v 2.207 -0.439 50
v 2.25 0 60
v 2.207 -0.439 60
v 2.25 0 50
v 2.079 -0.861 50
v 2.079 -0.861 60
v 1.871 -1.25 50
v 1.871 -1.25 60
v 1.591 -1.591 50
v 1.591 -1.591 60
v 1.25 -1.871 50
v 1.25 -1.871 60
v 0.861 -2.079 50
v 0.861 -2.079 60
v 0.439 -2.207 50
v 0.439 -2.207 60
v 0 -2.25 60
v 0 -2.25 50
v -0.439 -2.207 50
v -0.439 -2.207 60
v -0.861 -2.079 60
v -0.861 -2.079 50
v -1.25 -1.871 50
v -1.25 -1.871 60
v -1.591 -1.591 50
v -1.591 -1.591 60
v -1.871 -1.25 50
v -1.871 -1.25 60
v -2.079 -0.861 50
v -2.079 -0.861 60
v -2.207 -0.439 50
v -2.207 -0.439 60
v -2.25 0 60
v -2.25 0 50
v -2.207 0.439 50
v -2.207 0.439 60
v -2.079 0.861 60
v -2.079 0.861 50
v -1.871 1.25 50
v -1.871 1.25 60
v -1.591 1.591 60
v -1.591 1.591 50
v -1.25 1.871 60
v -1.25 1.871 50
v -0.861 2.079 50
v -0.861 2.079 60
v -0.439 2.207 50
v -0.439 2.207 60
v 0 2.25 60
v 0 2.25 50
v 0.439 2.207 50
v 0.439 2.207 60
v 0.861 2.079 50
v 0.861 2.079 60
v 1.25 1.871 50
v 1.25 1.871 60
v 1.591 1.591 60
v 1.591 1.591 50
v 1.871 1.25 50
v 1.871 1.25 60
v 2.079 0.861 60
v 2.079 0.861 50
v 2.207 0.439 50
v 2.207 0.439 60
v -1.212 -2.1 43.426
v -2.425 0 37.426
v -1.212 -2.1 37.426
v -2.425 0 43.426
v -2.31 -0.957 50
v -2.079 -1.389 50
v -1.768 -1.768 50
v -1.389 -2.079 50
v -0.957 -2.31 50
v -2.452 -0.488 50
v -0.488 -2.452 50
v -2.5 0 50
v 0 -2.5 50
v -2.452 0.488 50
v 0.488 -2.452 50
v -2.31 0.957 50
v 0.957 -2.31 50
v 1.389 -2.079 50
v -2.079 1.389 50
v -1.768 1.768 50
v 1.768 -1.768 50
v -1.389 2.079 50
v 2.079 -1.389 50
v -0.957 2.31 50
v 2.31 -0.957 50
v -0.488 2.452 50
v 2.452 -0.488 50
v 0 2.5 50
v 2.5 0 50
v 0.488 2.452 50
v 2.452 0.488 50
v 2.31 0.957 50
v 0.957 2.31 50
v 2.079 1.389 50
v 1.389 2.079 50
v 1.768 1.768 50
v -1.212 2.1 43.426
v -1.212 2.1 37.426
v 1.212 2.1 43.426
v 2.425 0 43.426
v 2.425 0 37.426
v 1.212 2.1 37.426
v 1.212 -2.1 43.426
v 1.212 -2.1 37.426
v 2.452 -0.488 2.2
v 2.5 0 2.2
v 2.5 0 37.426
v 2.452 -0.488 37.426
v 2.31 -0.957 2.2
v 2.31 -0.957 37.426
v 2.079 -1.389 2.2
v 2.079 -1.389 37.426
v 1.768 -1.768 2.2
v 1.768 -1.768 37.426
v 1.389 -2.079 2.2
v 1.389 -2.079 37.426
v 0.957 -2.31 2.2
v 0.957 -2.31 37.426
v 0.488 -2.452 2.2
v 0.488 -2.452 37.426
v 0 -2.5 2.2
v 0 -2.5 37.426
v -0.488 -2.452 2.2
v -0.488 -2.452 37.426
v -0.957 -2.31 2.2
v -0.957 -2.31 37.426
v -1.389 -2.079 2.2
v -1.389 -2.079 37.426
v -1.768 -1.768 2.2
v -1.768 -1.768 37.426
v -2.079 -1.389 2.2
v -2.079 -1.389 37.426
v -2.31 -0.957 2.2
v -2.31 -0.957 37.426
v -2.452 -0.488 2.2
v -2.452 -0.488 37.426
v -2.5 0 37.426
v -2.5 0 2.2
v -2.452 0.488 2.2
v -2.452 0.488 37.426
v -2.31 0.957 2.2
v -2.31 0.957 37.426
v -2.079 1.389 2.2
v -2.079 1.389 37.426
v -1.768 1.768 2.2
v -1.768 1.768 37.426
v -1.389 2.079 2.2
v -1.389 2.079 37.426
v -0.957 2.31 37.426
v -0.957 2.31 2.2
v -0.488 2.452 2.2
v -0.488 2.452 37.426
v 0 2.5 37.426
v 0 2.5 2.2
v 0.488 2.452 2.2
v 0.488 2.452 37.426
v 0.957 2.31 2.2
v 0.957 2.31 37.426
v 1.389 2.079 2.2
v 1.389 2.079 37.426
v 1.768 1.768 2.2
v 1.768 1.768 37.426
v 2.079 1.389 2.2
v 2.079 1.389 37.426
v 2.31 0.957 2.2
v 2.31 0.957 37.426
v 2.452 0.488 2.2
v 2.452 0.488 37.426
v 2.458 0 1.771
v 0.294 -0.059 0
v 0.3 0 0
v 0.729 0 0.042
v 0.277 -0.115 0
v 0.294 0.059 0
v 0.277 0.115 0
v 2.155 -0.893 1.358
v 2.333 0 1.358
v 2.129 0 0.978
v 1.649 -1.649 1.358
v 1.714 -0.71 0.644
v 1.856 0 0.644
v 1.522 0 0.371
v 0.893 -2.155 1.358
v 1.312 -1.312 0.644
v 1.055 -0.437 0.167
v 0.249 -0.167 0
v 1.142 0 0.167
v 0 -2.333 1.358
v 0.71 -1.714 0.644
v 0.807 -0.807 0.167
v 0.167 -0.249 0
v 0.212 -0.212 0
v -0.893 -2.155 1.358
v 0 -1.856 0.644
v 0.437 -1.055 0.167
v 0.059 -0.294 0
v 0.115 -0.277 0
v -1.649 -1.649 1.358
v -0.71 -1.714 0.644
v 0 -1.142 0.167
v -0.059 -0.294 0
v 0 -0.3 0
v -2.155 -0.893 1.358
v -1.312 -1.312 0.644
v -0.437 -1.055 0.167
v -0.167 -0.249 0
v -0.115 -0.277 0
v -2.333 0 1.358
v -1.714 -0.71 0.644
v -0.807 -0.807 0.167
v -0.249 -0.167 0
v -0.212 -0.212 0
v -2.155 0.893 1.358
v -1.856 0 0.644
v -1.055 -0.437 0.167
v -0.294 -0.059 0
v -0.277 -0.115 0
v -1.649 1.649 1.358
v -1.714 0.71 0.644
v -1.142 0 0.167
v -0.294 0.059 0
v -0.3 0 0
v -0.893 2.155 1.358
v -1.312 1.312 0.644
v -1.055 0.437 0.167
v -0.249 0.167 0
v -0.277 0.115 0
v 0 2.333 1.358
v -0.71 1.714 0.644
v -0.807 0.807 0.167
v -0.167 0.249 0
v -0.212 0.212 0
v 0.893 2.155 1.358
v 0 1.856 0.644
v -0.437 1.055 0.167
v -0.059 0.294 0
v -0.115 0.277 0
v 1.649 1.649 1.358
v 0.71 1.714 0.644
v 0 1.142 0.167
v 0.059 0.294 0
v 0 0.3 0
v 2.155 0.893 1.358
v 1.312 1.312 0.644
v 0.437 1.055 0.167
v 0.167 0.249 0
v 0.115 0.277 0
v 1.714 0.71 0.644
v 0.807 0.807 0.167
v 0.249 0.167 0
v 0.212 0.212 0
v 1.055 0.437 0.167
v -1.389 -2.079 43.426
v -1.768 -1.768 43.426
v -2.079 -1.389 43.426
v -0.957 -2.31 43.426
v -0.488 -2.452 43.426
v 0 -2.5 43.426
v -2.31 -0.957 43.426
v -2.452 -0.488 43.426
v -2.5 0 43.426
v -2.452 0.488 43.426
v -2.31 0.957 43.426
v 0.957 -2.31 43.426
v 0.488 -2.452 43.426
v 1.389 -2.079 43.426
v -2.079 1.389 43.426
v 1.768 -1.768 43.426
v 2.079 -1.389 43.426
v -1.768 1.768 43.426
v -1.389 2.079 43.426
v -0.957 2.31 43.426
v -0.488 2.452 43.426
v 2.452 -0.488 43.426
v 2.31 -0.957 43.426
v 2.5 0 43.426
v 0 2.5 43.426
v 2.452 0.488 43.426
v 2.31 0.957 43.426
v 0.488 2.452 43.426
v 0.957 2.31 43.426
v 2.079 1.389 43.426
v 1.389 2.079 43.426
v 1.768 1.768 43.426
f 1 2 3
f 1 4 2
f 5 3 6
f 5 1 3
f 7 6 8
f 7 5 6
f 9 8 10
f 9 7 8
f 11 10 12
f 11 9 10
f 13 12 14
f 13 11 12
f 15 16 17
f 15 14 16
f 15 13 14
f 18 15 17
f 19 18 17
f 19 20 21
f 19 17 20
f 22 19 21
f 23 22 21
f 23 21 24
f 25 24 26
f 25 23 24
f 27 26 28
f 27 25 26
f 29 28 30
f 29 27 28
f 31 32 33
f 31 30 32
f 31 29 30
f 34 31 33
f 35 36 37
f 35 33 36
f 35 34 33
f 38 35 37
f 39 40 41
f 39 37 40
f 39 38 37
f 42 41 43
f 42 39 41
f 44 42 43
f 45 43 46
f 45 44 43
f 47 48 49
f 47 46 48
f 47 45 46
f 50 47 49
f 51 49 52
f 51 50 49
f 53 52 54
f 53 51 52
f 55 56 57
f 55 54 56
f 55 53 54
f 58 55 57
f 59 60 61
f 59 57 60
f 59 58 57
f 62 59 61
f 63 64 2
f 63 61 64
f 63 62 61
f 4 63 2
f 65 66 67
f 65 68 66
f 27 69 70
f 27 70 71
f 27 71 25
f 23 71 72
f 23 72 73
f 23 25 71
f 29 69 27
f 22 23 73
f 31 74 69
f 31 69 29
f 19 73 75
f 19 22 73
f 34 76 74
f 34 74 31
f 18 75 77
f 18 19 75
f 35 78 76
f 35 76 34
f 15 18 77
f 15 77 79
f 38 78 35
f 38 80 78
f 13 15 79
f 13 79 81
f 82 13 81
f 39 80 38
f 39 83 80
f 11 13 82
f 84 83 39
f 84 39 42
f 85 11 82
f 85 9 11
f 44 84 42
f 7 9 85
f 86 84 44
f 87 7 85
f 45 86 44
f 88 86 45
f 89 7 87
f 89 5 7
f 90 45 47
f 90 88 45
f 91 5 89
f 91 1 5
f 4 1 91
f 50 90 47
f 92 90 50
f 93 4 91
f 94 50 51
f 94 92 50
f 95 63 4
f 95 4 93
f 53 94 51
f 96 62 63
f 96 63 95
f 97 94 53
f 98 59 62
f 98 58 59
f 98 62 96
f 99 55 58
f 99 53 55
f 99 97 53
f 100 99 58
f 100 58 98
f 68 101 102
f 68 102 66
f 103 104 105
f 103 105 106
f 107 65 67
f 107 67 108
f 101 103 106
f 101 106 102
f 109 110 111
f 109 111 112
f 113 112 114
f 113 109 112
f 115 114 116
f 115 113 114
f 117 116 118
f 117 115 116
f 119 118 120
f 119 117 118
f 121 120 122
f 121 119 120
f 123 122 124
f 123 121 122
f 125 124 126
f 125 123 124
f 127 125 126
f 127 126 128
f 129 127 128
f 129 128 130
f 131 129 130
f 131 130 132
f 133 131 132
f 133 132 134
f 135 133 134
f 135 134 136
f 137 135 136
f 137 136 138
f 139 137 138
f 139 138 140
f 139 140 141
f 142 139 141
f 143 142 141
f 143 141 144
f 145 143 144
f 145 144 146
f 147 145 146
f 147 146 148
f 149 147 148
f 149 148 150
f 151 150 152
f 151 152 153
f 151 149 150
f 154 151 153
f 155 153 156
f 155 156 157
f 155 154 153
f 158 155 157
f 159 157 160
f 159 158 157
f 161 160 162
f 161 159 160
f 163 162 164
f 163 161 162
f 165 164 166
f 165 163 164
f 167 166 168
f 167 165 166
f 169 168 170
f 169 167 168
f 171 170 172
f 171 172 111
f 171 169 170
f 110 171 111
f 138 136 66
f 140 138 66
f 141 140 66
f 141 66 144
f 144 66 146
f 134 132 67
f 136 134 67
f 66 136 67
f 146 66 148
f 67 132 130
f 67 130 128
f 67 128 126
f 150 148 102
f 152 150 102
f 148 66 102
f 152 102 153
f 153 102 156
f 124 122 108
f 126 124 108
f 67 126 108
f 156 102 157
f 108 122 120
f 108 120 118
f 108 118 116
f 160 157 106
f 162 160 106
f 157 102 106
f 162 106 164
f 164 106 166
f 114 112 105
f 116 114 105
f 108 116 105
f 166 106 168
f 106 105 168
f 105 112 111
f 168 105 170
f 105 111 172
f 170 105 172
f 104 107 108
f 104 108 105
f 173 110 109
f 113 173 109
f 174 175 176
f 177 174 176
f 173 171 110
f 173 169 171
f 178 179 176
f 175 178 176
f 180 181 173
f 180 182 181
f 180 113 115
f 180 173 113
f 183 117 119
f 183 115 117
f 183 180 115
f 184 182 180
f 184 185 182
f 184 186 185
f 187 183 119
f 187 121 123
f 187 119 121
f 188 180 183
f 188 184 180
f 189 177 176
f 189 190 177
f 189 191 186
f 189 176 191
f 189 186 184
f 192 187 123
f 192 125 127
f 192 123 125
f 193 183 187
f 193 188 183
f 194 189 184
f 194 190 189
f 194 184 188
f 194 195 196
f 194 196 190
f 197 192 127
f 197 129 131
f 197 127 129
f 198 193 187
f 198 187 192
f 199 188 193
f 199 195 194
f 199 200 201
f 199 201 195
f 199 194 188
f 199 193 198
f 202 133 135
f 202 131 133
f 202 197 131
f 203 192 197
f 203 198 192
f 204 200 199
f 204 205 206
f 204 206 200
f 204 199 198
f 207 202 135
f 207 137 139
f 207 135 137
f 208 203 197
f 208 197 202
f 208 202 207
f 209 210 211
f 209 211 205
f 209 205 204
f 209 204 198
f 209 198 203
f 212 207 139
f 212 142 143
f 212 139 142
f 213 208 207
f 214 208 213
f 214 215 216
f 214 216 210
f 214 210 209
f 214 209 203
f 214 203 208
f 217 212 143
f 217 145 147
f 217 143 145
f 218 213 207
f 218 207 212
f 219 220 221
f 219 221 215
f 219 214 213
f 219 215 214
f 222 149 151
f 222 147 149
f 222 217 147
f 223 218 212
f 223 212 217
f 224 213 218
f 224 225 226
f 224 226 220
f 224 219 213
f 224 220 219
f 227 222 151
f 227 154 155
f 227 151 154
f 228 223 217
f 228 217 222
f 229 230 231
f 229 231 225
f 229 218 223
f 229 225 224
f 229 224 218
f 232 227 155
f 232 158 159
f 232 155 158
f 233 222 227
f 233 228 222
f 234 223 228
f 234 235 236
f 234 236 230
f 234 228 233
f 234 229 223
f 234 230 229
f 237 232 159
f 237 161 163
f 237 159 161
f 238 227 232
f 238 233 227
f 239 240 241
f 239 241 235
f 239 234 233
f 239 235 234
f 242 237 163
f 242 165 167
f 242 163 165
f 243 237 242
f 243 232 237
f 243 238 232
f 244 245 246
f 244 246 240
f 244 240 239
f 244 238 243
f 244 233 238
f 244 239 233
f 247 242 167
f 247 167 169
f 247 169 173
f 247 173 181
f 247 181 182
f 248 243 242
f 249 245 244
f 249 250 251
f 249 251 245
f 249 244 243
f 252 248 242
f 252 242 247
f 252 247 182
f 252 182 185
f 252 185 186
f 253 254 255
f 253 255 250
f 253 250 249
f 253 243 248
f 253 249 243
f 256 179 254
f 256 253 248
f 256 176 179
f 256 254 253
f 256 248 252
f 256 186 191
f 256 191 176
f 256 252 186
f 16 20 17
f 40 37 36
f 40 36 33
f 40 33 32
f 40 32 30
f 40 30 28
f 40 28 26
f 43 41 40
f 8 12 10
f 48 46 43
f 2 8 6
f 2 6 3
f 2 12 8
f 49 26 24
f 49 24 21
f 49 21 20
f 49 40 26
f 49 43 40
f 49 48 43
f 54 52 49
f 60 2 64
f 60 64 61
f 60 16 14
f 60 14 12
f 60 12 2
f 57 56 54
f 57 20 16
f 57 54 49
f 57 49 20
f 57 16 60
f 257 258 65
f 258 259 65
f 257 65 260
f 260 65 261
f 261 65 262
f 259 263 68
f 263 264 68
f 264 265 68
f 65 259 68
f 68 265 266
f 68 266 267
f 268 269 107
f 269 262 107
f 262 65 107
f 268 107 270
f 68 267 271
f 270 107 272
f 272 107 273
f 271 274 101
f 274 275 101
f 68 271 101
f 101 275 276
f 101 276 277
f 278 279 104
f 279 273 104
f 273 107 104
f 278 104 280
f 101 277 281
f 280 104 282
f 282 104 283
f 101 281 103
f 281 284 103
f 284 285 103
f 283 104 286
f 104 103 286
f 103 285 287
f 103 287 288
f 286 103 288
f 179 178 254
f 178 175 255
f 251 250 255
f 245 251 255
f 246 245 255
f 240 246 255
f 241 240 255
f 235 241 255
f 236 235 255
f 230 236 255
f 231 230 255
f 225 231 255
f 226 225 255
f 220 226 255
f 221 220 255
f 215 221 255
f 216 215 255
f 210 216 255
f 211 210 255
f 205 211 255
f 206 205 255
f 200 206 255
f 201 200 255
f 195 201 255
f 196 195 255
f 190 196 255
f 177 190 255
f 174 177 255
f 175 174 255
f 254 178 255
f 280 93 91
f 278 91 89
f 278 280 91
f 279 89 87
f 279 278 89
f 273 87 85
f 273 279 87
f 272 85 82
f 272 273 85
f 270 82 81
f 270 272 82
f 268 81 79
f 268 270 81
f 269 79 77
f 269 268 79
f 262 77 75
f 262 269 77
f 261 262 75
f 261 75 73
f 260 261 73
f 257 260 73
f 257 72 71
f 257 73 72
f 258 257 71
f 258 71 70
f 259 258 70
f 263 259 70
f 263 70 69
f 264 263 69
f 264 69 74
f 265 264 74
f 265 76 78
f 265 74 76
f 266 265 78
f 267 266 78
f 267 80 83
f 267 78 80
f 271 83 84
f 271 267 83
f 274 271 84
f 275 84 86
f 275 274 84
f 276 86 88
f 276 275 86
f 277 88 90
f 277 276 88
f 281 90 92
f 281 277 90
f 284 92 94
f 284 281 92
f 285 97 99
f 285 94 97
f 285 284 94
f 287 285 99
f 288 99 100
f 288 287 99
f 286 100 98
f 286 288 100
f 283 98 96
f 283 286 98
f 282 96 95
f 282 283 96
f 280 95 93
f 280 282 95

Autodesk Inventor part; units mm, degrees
ref_plane "YZ Plane" through (0, 0, 0) normal (1, 0, 0) x (0, 1, 0)
ref_plane "XY Plane" through (0, 0, 0) normal (0, 0, 1) x (1, 0, 0)
sketch "Skizze1" plane through (0, 0, 0) normal (0, 0, 1) x (1, 0, 0)
  circle A0 centre (0, 0) radius 2.5
  dimension "d0" = 5
extrude "Extrusion1" add sketch "Skizze1" along normal blind 50
fillet "Rundung1" radius 2.2 1 edges at (-2.5, 0, 0)
ref_plane "Arbeitsebene1" through (0, 2.5, 0) normal (0, 1, 0) x (-1, 0, 0)
sketch "Skizze2" plane through (0, 2.5, 0) normal (0, 1, 0) x (-1, 0, 0)
  line L0 (2.5, 2.2) -> (2.5, 50) projected
  line L1 (-2.5, 2.2) -> (-2.5, 50) projected
  line L2 (2.5, 43.4257) -> (-2.5, 43.4257)
  line L3 (-2.5, 43.4257) -> (-2.5, 37.4257)
  line L4 (-2.5, 37.4257) -> (2.5, 37.4257)
  line L5 (2.5, 37.4257) -> (2.5, 43.4257)
  point P0 (0, 0)
  point P1 (-2.5, 43.4257)
  dimension "d4" = 6
extrude "Extrusion2" cut sketch "Skizze2" against normal blind 0.4
pattern_circular "Runde Anordnung1" count 6 over 360 about axis through (0, 0, -10) along (0, 0, 1) of "Extrusion2"
sketch "Skizze3" plane through (0, 0, 50) normal (0, 0, 1) x (1, 0, 0)
  circle A0 centre (0, 0) radius 2.25
  dimension "d10" = 4.5
extrude "Extrusion3" add sketch "Skizze3" along normal blind 10
properties part number "Thermoelement"
